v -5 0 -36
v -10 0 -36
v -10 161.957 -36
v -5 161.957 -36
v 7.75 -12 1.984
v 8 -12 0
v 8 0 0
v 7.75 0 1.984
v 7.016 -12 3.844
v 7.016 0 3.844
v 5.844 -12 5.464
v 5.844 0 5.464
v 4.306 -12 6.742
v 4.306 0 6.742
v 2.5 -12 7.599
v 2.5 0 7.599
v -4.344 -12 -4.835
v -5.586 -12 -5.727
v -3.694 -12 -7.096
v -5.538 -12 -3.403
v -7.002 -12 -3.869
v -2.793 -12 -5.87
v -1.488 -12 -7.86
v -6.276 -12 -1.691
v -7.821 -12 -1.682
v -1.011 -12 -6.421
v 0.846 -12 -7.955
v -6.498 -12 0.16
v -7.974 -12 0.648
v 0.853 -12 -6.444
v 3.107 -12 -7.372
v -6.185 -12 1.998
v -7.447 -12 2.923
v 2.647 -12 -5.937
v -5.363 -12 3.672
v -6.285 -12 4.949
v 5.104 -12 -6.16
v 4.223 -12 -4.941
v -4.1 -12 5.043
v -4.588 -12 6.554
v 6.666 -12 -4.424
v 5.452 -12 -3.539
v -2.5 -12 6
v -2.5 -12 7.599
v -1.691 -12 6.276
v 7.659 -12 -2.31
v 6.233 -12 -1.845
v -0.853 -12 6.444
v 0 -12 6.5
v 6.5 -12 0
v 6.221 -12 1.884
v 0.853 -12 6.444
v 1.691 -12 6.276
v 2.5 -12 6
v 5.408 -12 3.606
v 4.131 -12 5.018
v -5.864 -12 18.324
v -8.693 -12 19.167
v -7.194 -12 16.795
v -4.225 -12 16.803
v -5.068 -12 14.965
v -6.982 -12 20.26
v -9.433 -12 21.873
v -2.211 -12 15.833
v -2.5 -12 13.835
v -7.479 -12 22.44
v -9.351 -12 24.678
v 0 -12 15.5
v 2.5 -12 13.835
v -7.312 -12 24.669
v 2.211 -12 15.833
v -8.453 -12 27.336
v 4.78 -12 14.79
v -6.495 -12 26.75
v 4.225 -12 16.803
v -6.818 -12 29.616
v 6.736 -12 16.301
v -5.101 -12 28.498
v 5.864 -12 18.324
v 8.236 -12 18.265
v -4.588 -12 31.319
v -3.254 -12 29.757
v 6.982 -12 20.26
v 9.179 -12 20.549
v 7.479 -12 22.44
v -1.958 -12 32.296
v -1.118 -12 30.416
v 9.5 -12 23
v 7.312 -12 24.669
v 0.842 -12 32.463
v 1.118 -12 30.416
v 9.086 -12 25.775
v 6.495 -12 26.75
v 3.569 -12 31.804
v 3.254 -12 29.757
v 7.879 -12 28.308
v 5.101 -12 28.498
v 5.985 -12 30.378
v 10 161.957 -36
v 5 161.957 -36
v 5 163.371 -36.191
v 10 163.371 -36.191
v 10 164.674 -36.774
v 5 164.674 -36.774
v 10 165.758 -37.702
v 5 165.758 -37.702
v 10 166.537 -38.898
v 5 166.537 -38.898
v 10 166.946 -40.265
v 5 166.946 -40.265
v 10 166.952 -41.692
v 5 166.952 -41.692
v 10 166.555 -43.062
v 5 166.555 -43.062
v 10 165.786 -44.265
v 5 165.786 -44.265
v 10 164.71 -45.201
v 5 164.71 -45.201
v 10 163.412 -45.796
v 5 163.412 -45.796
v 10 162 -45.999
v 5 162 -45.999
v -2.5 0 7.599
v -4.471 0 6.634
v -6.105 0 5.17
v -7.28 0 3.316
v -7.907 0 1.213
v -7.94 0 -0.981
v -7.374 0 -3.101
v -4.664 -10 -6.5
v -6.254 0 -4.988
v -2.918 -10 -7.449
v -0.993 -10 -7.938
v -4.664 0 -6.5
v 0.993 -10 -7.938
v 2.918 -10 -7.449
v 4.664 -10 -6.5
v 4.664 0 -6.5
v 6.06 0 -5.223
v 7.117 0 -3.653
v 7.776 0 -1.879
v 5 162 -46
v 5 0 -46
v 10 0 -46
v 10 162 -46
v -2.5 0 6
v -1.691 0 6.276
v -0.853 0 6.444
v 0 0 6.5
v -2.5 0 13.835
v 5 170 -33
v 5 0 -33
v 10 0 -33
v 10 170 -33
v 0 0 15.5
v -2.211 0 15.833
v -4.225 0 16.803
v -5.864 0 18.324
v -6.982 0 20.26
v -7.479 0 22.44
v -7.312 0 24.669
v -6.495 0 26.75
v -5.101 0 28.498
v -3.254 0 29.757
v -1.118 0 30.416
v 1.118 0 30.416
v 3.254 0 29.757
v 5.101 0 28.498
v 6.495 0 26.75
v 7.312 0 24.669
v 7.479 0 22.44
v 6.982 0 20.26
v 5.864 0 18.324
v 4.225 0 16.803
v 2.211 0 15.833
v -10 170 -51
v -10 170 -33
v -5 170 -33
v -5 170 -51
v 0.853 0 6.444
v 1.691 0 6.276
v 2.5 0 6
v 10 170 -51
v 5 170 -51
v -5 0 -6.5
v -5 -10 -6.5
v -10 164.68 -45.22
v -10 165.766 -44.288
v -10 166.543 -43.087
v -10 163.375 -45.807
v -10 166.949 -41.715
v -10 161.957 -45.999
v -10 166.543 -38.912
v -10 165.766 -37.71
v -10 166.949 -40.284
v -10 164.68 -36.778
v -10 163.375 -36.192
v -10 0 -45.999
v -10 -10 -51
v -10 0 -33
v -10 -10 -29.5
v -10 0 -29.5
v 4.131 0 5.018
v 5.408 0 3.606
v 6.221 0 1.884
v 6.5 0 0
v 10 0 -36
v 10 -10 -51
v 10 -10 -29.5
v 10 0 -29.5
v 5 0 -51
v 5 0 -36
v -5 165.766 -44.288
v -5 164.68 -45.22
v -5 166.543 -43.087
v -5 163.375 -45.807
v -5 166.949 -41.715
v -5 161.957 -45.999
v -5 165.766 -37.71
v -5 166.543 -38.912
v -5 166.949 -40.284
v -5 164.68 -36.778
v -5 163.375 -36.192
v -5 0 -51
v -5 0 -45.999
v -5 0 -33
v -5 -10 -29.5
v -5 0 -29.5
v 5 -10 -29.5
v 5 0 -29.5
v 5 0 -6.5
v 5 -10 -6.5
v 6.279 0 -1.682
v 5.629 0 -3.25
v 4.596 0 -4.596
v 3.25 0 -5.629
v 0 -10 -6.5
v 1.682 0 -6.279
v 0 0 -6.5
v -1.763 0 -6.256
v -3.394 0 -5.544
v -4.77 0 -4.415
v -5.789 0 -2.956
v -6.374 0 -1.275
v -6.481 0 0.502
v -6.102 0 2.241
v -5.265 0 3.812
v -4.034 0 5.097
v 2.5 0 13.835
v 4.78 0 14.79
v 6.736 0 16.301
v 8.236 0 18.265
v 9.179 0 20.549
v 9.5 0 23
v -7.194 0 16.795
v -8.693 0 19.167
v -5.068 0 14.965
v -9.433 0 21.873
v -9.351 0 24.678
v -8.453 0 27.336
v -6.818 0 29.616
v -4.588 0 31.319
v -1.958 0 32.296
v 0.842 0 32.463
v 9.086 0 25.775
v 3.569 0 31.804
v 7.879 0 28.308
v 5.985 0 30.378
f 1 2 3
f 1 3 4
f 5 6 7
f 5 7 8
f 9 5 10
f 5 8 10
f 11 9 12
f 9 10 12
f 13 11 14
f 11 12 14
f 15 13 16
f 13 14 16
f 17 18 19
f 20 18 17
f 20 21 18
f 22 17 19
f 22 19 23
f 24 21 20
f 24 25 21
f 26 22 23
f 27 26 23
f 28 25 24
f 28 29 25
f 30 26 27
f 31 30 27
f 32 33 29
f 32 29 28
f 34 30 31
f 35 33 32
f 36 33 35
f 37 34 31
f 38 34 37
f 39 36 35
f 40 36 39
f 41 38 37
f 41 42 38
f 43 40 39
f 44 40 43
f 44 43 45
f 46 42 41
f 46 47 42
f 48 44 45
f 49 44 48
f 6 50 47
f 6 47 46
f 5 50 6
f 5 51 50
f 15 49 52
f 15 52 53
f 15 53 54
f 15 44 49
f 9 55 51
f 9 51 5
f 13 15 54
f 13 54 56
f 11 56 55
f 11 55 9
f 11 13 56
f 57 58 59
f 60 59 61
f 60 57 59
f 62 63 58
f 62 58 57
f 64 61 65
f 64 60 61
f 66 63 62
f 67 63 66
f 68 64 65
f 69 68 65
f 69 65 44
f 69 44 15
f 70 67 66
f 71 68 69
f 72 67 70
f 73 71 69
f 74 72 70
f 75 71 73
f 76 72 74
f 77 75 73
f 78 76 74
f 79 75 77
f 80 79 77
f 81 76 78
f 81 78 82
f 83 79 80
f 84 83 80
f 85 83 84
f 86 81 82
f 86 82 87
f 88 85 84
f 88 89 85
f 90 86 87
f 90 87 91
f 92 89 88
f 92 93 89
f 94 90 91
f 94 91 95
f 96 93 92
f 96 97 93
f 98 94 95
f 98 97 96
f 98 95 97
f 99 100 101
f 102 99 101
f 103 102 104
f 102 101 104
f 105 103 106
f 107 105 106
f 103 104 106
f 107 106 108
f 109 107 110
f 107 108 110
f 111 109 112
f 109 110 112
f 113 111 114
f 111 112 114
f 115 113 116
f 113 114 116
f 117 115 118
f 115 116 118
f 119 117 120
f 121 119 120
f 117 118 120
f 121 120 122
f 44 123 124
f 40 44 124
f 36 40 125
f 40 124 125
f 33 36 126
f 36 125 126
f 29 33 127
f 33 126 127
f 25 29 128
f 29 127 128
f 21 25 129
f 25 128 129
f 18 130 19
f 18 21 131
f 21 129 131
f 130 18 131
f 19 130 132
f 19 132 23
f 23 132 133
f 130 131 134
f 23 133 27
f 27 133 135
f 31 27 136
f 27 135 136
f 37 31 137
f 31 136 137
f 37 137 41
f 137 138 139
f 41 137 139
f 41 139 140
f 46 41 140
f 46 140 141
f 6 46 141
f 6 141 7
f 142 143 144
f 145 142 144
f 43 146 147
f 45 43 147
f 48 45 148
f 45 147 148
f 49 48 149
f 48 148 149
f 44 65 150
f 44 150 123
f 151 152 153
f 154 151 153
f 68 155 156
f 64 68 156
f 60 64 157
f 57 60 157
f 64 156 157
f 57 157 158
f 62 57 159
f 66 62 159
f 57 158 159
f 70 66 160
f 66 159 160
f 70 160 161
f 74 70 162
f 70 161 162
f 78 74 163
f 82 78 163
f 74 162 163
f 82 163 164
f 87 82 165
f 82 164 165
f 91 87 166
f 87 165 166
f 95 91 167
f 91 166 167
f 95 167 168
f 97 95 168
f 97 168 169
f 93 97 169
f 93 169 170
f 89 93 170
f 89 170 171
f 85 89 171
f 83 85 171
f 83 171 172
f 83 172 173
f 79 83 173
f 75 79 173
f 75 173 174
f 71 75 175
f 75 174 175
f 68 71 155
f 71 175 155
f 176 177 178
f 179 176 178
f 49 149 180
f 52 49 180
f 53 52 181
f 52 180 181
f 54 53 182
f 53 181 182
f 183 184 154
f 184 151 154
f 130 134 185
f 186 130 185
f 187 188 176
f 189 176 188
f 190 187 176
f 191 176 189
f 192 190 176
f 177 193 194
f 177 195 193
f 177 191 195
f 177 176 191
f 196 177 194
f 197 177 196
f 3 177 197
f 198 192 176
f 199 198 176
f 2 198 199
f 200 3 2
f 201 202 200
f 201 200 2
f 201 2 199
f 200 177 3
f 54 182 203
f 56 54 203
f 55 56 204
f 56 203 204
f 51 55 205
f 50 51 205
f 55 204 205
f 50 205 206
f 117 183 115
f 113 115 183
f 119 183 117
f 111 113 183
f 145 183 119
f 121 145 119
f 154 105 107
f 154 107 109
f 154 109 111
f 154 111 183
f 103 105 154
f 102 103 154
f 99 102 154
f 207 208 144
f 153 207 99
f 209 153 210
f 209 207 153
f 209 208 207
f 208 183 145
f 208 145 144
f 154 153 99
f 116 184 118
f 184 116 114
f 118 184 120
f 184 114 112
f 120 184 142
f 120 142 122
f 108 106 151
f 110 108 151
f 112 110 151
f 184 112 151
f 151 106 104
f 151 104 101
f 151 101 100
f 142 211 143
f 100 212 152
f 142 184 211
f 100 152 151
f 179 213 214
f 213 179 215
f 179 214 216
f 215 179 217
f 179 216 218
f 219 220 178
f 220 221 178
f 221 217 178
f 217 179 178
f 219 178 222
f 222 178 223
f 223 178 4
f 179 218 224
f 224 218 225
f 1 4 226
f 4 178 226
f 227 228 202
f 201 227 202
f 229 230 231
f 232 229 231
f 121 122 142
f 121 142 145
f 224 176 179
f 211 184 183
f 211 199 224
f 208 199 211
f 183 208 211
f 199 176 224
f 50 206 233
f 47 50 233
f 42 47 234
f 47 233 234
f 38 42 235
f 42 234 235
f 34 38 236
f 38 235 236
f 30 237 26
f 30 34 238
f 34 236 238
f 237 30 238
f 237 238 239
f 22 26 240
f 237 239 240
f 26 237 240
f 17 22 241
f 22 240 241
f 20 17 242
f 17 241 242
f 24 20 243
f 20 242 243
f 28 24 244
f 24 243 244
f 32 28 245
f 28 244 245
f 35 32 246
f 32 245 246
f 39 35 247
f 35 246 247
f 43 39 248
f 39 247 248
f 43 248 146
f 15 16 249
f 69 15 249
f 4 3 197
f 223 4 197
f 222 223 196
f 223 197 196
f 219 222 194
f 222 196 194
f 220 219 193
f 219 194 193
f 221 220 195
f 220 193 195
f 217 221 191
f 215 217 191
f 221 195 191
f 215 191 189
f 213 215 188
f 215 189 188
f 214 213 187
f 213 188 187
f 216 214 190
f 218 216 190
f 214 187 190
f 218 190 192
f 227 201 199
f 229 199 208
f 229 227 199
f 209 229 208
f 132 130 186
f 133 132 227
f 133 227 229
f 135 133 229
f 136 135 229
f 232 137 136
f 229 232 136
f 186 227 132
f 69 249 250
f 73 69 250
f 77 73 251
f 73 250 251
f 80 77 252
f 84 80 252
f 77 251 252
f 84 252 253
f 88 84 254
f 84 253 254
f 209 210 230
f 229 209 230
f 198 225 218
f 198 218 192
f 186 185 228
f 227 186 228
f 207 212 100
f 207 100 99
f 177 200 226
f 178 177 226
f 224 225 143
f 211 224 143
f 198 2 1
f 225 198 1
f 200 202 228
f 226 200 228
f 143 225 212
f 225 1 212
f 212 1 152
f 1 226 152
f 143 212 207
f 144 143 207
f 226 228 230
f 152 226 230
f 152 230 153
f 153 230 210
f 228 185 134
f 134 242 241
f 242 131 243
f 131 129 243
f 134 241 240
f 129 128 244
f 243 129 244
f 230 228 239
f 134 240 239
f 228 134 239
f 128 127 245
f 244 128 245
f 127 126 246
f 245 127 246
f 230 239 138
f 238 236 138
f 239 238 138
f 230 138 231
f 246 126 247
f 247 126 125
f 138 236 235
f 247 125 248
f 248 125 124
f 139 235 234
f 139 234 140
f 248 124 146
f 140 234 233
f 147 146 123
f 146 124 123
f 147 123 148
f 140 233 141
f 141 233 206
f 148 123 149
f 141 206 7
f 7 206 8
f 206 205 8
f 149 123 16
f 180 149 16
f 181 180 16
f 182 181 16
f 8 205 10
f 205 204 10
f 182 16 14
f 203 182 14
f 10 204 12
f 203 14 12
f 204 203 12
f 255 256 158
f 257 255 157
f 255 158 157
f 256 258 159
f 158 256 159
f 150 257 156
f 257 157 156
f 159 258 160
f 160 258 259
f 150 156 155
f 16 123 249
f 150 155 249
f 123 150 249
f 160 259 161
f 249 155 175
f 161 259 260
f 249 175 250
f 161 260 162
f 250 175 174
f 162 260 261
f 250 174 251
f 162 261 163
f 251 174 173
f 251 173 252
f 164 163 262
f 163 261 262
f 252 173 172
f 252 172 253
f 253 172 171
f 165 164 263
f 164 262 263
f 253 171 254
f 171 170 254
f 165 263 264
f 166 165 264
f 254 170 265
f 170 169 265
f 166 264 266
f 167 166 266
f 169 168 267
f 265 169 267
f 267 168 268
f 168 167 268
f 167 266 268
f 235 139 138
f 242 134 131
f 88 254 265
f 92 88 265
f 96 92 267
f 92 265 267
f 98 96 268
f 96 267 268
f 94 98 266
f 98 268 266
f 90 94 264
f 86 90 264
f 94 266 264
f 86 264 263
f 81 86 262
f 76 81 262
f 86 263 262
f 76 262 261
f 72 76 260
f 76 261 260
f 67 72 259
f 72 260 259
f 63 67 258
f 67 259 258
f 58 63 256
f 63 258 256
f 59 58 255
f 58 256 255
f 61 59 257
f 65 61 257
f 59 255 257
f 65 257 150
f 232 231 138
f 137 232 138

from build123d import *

# Parameters (mm, degrees)
F1_DEPTH = 12
F3_DEPTH = 10
F4_W     = 5
F4_H     = 5
F4_H_2   = 3
F5_DEPTH = 170
F6_W     = 5
F6_H     = 8
F7_DEPTH = 12.7
F9_DEPTH = 25


with BuildPart() as f1:
    # F0 (on Front) → F1 (new body)
    with BuildSketch(Plane.XZ):
        with BuildLine():
            Line((0, 8), (0, 6.5))
            ThreePointArc((0, 6.5), (1.2747548784, 6.373774392), (2.5, 6))
            Line((2.5, 6), (2.5, 7.5993420768))
            ThreePointArc((2.5, 7.5993420768), (1.2659509046, 7.8992004853), (0, 8))
        make_face()
        with BuildLine():
            ThreePointArc((-2.5, 6), (-1.2747548784, 6.373774392), (0, 6.5))
            Line((0, 6.5), (0, 8))
            ThreePointArc((0, 8), (-1.2659509046, 7.8992004853), (-2.5, 7.5993420768))
            Line((-2.5, 7.5993420768), (-2.5, 6))
        make_face()
        with BuildLine():
            Line((2.5, 7.5993420768), (2.5, 6))
            ThreePointArc((2.5, 6), (5.4083269132, 3.6055512755), (6.5, 0))
            ThreePointArc((6.5, 0), (-3.6055512755, -5.4083269132), (-2.5, 6))
            Line((-2.5, 6), (-2.5, 7.5993420768))
            ThreePointArc((-2.5, 7.5993420768), (-4.6904157598, -6.4807406984), (8, 0))
            ThreePointArc((8, 0), (6.4807406984, 4.6904157598), (2.5, 7.5993420768))
        make_face()
        with BuildLine():
            ThreePointArc((-2.5, 13.8348486101), (-1.2611625184, 13.5840842664), (0, 13.5))
            Line((0, 13.5), (0, 14.832704328))
            Line((0, 14.832704328), (-2.5, 14.832704328))
            Line((-2.5, 14.832704328), (-2.5, 13.8348486101))
        make_face()
        with BuildLine():
            Line((0, 14.832704328), (0, 13.5))
            ThreePointArc((0, 13.5), (1.2611625184, 13.5840842664), (2.5, 13.8348486101))
            Line((2.5, 13.8348486101), (2.5, 14.832704328))
            Line((2.5, 14.832704328), (0, 14.832704328))
        make_face()
        with BuildLine():
            Line((-2.5, 14.832704328), (0, 14.832704328))
            Line((0, 14.832704328), (2.5, 14.832704328))
            Line((2.5, 14.832704328), (2.5, 13.8348486101))
            ThreePointArc((2.5, 13.8348486101), (7.5498344353, 17.2337187027), (9.5, 23))
            ThreePointArc((9.5, 23), (-5.7662812973, 30.5498344353), (-2.5, 13.8348486101))
            Line((-2.5, 13.8348486101), (-2.5, 14.832704328))
        make_face()
        with BuildLine():
            ThreePointArc((7.5, 23), (5.3033008589, 17.6966991411), (0, 15.5))
            ThreePointArc((0, 15.5), (-5.3033008589, 28.3033008589), (7.5, 23))
        make_face(mode=Mode.SUBTRACT)
        with BuildLine():
            Line((0, 13.5), (0, 8))
            ThreePointArc((0, 8), (1.2659509046, 7.8992004853), (2.5, 7.5993420768))
            Line((2.5, 7.5993420768), (2.5, 13.8348486101))
            ThreePointArc((2.5, 13.8348486101), (1.2611625184, 13.5840842664), (0, 13.5))
        make_face()
        with BuildLine():
            ThreePointArc((-2.5, 7.5993420768), (-1.2659509046, 7.8992004853), (0, 8))
            Line((0, 8), (0, 13.5))
            ThreePointArc((0, 13.5), (-1.2611625184, 13.5840842664), (-2.5, 13.8348486101))
            Line((-2.5, 13.8348486101), (-2.5, 7.5993420768))
        make_face()
    extrude(amount=F1_DEPTH)

    # F2 (on Front) → F3 (join)
    with BuildSketch(Plane.XZ):
        Polygon((5, -6.5), (0, -6.5), (-5, -6.5), (-5, -29.5), (-10, -29.5), (-10, -51), (10, -51), (10, -29.5), (5, -29.5), align=None)
    extrude(amount=F3_DEPTH)

    # F4 (on Front) → F5 (join)
    with BuildSketch(Plane.XZ):
        with Locations((7.5, -48.5)):
            Rectangle(F4_W, F4_H)
        with Locations((7.5, -34.4996317649)):
            Rectangle(F4_W, F4_H_2)
        with Locations((-7.5, -34.4996317649)):
            Rectangle(F4_W, F4_H_2)
        Polygon((-5, -46), (-5, -45.9992635297), (-10, -45.9992635297), (-10, -51), (-5, -51), align=None)
    extrude(amount=-F5_DEPTH)

    # F6 (on face) → F7 (join)
    with BuildSketch(Plane(origin=(0, 0, -35.9996317649), x_dir=(1, 0, 0), z_dir=(0, 0, -1))):
        with Locations((-7.5, -166)):
            Rectangle(F6_W, F6_H)
        with Locations((7.5, -166)):
            Rectangle(F6_W, F6_H)
    extrude(amount=F7_DEPTH)

    # F8 (on face) → F9 (cut)
    with BuildSketch(Plane(origin=(-10, 0, 0), x_dir=(0, -1, 0), z_dir=(-1, 0, 0))):
        with BuildLine():
            Line((-162, -35.9996317649), (-161.9570914715, -35.9996317649))
            ThreePointArc((-161.9570914715, -35.9996317649), (-167, -40.9994476473), (-161.9570914715, -45.9992635297))
            Line((-161.9570914715, -45.9992635297), (-162, -45.9992635297))
            Line((-162, -45.9992635297), (-162, -35.9996317649))
        make_face()
        with BuildLine():
            ThreePointArc((-161.9570914715, -45.9992635297), (-158.4493280465, -44.51977841), (-157, -40.9994476473))
            ThreePointArc((-157, -40.9994476473), (-158.4493280465, -37.4791168846), (-161.9570914715, -35.9996317649))
            Line((-161.9570914715, -35.9996317649), (-162, -35.9996317649))
            Line((-162, -35.9996317649), (-162, -45.9992635297))
            Line((-162, -45.9992635297), (-161.9570914715, -45.9992635297))
        make_face()
    extrude(amount=-F9_DEPTH, mode=Mode.SUBTRACT)


solid = f1.part
